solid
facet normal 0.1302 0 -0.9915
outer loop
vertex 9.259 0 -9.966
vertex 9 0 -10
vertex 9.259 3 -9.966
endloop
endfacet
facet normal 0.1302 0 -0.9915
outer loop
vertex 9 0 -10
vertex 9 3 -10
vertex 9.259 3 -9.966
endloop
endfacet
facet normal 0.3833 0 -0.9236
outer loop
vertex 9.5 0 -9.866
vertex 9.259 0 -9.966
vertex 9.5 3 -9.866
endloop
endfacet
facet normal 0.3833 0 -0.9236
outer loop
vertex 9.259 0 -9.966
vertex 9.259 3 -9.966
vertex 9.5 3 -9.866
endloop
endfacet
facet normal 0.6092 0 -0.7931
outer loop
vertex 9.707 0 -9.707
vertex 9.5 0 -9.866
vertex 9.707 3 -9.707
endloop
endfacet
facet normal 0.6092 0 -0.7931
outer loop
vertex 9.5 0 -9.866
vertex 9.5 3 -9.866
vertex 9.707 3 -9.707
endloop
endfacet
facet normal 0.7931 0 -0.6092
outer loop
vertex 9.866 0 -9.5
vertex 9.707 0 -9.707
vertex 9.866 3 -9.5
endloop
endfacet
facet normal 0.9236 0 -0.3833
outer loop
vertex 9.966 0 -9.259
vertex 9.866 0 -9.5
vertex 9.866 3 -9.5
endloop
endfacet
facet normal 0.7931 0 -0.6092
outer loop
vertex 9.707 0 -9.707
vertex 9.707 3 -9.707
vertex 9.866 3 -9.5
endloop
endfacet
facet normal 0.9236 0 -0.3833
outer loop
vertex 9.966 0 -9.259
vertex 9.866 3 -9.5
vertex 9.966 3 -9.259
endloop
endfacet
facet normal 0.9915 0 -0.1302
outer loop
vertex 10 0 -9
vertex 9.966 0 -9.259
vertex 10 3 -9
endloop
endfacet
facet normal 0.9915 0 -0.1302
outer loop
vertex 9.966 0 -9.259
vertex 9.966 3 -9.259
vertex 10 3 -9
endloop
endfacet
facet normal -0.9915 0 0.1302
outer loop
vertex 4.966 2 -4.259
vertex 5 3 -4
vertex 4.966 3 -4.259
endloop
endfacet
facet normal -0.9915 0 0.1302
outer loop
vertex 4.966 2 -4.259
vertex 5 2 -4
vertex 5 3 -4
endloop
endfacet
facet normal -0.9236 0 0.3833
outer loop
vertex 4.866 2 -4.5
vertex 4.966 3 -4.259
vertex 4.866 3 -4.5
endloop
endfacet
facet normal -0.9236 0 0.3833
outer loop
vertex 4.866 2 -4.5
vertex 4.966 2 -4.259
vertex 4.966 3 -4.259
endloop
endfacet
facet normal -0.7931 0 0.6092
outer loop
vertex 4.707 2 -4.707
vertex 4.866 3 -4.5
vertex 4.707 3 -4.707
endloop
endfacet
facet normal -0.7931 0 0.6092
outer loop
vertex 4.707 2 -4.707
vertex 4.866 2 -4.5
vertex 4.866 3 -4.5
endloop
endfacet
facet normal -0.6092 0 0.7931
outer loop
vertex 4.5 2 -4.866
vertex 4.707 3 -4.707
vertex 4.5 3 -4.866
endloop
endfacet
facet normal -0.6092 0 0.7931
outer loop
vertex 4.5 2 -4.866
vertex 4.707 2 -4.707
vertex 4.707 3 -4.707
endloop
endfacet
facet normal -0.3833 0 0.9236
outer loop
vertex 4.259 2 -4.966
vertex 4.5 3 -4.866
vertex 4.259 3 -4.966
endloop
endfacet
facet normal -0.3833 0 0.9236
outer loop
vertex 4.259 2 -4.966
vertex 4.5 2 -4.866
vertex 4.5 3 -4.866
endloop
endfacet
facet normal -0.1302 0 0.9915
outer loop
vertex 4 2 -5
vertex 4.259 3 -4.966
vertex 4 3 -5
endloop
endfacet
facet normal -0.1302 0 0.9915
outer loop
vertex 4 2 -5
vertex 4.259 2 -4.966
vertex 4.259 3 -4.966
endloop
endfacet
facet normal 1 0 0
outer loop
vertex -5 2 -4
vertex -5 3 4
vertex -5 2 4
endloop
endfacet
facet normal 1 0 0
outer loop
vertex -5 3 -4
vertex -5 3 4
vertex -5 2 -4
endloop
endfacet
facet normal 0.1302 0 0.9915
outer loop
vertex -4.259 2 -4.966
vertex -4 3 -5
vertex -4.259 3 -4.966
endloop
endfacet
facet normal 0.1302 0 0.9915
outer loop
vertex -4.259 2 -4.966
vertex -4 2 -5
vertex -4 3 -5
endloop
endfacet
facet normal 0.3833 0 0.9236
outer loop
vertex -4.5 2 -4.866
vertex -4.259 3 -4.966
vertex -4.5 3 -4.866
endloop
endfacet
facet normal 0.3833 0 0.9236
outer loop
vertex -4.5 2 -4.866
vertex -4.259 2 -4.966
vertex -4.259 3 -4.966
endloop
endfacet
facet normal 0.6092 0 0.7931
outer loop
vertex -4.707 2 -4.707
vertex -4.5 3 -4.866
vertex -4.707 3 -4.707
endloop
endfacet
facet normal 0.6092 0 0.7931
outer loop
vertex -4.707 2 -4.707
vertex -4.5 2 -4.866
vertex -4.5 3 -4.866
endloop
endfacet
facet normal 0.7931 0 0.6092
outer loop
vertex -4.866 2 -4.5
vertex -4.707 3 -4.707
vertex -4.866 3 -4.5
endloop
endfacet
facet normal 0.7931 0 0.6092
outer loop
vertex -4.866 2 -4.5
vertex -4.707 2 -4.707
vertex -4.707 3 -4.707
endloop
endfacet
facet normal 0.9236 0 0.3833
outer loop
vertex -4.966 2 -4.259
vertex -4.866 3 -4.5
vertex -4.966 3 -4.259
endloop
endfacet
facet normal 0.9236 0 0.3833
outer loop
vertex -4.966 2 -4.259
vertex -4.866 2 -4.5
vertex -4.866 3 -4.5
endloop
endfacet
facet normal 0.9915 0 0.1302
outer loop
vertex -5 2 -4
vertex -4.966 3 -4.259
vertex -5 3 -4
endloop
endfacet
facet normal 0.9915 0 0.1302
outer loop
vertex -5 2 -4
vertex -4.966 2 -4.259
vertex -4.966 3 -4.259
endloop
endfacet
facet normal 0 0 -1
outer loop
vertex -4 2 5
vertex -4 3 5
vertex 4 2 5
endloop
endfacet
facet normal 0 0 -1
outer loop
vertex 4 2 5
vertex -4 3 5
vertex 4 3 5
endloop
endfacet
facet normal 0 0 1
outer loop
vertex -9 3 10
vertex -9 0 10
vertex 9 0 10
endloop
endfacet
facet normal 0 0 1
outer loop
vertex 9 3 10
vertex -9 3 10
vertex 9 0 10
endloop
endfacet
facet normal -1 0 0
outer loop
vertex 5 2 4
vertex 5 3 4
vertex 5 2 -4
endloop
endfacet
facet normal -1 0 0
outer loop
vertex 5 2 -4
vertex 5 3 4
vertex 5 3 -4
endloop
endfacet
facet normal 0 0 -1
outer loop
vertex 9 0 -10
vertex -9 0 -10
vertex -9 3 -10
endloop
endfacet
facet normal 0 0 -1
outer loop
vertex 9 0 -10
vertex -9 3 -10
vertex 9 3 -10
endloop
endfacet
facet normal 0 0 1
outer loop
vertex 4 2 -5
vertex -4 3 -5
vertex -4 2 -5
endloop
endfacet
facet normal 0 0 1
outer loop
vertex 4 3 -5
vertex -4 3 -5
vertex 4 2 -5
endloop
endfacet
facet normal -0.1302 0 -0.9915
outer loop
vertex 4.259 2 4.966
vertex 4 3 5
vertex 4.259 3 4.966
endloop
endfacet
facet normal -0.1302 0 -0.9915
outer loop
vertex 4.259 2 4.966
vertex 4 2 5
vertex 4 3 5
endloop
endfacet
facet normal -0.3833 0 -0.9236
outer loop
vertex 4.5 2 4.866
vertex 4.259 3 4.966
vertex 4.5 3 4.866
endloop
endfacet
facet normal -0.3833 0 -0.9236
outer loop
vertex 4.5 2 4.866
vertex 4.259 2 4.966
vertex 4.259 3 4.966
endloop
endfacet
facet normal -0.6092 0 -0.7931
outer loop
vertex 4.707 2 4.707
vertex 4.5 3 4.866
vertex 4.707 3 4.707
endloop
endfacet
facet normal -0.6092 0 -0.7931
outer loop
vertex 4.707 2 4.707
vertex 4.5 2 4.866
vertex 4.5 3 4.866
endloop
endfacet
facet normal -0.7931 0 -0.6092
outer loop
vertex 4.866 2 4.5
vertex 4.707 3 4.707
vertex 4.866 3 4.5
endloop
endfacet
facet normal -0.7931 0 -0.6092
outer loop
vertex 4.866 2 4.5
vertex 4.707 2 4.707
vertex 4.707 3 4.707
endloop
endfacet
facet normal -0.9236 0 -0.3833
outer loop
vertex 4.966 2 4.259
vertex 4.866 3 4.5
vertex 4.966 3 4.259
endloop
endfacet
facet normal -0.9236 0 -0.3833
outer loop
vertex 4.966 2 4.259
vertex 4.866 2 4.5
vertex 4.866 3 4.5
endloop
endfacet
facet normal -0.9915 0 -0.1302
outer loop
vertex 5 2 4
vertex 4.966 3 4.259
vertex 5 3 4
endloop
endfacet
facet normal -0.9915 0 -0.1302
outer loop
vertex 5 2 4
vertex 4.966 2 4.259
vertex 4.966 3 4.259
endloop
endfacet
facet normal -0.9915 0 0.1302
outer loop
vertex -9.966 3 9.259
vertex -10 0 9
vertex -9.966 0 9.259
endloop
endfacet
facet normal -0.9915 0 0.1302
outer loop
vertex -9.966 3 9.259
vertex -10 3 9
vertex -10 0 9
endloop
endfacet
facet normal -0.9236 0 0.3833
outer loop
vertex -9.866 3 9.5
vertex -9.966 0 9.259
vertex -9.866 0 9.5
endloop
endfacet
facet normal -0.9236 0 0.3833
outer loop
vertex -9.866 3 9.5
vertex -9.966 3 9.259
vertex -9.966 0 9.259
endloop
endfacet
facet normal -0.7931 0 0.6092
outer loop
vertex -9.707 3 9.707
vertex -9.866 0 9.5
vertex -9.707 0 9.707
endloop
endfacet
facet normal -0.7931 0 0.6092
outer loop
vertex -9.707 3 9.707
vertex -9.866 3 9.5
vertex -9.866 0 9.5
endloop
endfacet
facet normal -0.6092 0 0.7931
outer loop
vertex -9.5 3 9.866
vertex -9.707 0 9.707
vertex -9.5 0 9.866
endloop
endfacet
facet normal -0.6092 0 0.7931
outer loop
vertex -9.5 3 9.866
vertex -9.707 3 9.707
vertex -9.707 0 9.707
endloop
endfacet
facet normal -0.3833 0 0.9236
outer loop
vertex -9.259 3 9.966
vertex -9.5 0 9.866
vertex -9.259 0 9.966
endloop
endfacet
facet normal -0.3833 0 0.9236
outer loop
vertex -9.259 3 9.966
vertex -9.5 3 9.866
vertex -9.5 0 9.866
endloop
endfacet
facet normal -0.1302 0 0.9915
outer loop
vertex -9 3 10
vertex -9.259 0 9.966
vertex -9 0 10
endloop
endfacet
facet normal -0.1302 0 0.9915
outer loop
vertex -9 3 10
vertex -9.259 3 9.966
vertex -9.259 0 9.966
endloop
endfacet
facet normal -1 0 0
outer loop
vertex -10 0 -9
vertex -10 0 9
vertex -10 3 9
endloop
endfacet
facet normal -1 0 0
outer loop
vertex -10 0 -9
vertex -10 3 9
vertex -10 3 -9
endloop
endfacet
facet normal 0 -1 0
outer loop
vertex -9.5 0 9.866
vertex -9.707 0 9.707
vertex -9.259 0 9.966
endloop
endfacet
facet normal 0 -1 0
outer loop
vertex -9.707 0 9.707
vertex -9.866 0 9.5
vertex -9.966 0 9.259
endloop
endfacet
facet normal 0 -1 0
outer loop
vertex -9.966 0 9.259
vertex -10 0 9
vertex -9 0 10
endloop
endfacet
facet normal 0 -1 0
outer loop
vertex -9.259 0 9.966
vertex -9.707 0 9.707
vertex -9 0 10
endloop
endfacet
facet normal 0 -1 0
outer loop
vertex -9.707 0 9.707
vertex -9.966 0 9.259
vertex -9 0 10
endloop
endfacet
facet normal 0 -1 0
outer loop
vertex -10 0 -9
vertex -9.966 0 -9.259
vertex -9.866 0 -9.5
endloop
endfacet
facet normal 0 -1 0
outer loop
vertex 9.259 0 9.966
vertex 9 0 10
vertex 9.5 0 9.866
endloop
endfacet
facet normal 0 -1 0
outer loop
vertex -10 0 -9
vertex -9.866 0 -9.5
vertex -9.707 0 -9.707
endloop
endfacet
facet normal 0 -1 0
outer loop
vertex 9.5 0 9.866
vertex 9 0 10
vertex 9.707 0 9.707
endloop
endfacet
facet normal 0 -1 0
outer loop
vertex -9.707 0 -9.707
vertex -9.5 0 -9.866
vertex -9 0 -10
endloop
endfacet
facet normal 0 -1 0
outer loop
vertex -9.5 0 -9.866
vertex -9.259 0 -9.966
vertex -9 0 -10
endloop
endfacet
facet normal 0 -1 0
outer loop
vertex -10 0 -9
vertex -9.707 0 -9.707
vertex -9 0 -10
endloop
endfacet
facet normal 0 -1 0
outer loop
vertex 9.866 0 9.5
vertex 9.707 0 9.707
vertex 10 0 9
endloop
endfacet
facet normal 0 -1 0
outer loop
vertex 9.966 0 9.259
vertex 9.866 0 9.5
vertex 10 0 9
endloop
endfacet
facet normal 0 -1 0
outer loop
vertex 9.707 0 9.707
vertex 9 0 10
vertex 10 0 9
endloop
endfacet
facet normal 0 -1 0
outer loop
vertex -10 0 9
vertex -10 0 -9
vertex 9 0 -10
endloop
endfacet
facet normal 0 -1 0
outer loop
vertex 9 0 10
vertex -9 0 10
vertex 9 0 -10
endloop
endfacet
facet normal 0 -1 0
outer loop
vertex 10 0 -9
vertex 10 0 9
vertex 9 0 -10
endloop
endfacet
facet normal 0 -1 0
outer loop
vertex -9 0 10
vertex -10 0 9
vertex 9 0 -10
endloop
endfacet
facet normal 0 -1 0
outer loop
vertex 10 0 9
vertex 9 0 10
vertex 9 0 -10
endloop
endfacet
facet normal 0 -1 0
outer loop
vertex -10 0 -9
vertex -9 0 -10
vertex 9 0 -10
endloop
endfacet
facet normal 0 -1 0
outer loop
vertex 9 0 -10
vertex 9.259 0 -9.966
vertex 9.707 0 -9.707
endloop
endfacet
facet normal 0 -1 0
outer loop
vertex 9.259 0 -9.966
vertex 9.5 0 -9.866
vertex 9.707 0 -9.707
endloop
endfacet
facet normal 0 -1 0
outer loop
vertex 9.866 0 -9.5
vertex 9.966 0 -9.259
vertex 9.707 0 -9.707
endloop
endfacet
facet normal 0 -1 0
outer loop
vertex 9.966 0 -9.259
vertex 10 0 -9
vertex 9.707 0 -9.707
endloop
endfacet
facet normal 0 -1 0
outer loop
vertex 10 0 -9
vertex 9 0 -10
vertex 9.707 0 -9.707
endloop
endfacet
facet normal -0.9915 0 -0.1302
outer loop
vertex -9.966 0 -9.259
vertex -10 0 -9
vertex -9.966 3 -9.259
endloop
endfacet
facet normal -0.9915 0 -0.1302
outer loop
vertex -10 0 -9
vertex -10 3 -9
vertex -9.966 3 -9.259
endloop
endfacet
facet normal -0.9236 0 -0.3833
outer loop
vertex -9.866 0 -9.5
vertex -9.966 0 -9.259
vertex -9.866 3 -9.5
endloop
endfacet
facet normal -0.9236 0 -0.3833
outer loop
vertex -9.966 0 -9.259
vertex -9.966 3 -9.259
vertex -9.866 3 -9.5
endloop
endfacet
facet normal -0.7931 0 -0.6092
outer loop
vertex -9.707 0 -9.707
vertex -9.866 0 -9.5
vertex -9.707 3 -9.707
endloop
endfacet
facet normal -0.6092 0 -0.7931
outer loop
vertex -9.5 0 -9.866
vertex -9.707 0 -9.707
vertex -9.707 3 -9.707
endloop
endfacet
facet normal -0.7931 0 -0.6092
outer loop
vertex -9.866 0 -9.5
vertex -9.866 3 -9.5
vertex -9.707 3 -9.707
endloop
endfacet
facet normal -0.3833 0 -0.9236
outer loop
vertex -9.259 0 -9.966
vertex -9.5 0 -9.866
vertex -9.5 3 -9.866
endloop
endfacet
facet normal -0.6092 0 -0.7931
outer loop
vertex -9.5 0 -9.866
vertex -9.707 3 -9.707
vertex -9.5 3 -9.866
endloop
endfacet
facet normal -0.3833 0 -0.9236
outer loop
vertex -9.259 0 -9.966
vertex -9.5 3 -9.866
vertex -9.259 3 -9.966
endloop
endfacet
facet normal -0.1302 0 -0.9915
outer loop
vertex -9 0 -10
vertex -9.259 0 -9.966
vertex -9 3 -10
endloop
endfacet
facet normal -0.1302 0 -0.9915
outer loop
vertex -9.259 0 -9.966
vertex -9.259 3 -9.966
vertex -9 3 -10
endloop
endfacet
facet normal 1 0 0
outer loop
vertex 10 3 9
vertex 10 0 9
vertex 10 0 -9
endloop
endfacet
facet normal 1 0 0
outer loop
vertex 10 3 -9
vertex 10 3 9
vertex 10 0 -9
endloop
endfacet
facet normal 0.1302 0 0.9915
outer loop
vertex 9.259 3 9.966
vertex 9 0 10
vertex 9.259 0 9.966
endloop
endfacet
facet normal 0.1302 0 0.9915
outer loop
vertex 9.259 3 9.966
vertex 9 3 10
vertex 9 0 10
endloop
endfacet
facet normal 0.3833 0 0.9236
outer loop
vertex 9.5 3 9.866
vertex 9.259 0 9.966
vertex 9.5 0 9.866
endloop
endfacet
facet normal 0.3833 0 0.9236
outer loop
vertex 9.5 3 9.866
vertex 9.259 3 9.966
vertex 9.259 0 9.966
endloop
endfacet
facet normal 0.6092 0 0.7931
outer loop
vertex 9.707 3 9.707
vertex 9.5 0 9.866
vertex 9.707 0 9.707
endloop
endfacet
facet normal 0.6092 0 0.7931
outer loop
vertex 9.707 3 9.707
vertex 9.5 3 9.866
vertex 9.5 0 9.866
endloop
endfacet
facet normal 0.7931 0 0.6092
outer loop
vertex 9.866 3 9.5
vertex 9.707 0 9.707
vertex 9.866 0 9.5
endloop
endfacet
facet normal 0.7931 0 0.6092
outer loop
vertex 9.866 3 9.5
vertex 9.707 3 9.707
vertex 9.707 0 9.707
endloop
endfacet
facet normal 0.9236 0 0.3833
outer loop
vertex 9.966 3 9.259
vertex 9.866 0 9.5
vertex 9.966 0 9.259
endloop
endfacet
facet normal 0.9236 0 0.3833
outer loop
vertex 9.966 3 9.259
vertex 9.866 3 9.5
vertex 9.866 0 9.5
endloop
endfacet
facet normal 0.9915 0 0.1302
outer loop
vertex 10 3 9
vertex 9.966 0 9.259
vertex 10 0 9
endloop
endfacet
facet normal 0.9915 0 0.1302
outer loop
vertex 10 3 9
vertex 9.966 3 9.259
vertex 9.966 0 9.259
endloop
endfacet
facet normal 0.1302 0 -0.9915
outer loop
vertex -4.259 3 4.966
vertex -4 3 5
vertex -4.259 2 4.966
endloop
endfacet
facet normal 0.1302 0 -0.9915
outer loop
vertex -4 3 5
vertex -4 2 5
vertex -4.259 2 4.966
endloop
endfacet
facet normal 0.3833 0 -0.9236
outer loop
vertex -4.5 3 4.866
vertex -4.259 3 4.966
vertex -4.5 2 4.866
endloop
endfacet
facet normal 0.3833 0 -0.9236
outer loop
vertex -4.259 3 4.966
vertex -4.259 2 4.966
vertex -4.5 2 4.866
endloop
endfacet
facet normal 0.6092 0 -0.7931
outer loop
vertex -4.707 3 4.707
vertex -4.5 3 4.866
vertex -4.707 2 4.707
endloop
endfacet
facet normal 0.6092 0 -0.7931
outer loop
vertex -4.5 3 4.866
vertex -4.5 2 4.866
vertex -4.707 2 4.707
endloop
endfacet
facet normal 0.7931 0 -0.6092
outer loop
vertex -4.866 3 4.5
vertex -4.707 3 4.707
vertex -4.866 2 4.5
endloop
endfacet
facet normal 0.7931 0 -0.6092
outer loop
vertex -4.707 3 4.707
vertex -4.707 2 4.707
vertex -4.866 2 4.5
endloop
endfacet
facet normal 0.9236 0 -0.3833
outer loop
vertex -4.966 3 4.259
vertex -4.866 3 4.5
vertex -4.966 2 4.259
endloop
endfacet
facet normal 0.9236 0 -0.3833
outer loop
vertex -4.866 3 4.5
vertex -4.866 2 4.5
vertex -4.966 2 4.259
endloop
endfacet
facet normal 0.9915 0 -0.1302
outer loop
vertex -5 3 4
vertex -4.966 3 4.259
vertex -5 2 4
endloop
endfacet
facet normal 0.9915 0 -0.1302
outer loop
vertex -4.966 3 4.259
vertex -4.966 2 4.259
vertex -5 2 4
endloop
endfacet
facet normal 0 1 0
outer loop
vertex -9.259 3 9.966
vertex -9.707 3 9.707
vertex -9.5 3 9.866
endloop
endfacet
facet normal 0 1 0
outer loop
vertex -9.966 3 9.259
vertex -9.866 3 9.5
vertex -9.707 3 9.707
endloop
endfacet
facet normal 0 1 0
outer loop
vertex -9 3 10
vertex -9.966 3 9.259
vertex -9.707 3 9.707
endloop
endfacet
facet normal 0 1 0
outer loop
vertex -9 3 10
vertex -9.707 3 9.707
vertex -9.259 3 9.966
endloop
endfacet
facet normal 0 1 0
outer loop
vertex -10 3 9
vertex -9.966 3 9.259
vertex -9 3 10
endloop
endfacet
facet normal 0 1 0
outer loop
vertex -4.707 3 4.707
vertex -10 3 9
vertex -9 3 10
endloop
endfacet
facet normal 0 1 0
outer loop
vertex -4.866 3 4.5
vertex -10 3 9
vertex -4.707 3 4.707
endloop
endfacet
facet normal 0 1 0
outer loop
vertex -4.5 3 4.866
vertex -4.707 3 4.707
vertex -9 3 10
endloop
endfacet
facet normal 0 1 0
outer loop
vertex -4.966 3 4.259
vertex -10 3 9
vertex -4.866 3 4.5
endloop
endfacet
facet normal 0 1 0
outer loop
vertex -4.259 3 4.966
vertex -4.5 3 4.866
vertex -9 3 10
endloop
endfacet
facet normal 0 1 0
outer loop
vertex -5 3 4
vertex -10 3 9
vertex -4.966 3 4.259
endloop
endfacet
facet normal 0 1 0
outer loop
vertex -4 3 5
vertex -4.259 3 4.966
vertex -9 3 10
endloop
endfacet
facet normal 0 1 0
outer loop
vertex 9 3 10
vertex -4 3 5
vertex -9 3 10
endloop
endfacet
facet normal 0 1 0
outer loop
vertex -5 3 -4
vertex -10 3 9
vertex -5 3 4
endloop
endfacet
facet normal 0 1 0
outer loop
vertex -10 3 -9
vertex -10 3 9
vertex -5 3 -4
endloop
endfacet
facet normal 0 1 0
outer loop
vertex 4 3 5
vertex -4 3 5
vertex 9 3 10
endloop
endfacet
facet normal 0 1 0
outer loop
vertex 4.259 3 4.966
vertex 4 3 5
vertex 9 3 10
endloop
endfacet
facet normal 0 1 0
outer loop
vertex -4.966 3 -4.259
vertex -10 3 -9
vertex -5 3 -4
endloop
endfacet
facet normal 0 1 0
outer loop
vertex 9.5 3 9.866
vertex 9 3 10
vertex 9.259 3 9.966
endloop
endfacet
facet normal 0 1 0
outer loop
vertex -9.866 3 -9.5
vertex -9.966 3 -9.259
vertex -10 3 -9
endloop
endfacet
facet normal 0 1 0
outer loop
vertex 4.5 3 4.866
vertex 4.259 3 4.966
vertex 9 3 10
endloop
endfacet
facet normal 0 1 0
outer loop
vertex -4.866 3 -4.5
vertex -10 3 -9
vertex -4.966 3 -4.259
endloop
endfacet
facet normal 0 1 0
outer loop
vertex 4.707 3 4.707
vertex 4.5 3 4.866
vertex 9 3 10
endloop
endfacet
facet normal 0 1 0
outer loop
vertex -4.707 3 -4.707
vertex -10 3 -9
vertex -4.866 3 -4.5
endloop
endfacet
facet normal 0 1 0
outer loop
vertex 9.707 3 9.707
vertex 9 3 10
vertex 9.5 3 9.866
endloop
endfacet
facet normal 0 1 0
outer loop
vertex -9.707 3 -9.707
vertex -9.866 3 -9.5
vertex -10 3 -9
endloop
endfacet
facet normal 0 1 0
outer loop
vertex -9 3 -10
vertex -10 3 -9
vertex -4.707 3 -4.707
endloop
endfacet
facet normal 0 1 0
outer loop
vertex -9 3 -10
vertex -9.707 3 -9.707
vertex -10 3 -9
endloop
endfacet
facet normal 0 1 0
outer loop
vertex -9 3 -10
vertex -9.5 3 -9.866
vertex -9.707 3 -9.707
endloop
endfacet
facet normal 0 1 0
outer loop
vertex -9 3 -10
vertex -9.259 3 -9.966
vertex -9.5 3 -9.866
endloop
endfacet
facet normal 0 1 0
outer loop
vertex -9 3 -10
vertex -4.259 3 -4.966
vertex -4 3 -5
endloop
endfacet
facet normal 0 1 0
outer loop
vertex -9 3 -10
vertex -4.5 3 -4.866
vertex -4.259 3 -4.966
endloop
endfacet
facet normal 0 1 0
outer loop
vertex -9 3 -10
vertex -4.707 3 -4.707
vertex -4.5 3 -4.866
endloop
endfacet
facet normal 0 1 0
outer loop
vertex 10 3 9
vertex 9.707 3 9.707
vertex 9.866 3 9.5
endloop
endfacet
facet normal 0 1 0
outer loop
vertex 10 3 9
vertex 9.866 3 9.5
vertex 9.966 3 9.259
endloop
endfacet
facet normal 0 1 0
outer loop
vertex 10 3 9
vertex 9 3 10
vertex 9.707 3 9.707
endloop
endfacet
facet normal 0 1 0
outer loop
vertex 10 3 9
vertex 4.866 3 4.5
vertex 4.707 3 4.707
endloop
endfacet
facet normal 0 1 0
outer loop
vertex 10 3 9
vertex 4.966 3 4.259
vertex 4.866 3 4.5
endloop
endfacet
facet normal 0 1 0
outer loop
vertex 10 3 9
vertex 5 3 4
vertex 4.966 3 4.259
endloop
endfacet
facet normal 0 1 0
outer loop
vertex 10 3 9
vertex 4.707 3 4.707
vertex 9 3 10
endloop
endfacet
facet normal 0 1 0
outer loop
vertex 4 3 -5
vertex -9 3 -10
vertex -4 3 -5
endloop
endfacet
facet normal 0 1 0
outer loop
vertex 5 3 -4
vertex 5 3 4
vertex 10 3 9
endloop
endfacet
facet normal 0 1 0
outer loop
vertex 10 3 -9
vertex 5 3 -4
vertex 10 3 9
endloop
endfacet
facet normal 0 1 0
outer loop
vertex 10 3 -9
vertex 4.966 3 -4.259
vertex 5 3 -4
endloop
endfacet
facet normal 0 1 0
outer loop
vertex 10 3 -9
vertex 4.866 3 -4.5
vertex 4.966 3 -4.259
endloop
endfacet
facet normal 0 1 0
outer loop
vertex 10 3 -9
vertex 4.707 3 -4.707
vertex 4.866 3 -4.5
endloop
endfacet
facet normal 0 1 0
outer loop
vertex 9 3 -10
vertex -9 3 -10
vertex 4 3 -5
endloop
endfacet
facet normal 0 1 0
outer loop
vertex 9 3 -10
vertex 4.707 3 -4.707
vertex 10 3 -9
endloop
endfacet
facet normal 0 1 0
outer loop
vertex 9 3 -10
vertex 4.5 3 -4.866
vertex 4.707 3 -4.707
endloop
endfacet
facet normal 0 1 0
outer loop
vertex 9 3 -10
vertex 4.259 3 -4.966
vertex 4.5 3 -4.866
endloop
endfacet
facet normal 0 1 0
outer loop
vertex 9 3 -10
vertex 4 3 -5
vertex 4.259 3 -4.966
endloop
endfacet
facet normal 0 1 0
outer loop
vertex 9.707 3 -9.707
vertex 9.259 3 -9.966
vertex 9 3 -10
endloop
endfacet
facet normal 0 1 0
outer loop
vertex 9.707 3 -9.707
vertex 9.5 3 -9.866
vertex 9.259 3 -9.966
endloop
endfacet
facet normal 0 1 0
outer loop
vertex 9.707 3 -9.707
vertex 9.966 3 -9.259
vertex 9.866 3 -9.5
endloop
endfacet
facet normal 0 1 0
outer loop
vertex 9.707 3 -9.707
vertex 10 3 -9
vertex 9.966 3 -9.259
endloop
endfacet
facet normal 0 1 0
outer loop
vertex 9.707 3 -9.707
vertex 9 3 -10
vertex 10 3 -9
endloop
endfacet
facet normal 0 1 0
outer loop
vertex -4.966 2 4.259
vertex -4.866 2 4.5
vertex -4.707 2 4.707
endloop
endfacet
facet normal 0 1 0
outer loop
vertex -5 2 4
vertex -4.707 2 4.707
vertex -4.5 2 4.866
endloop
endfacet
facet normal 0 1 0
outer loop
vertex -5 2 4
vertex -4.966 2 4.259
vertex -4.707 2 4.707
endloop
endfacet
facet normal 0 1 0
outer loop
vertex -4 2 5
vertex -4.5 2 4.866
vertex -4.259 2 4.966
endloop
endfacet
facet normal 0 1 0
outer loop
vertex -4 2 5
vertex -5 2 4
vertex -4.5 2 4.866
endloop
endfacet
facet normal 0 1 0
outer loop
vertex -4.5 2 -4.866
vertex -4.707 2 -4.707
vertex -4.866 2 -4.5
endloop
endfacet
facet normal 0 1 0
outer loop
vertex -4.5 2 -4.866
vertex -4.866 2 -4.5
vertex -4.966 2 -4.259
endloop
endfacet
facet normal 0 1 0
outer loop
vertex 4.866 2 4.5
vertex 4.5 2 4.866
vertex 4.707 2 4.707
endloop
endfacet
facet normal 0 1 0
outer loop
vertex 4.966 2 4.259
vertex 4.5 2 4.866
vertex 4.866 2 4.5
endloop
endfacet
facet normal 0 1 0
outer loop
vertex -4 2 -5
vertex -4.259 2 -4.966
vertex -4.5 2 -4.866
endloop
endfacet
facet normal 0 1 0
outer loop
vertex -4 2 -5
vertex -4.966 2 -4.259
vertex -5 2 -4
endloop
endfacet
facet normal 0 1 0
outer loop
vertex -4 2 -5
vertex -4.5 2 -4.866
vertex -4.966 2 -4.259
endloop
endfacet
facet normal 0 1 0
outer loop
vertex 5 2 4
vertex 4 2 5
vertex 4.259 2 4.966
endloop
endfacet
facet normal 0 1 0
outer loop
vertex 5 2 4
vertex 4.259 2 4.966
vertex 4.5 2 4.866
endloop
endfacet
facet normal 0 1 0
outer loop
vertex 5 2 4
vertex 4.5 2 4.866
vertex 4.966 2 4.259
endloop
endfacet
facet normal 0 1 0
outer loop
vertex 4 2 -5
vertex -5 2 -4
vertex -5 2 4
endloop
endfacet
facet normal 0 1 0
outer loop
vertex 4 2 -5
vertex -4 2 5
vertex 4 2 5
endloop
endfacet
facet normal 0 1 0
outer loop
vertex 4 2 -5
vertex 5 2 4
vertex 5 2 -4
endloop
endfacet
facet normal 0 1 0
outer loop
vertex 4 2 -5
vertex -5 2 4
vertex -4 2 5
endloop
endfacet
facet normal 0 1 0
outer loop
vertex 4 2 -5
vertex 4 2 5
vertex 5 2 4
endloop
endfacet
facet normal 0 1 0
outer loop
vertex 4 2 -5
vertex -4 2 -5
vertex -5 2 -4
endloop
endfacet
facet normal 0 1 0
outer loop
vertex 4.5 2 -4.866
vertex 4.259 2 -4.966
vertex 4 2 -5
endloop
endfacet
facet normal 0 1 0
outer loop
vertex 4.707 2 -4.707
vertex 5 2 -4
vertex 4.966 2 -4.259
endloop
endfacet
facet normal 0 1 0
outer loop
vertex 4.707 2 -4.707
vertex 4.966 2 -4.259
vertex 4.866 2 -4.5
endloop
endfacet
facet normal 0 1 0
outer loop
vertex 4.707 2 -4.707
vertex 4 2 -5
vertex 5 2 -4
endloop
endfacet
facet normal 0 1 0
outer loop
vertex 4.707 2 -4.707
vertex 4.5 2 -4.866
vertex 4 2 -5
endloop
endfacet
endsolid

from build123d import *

# Parameters (mm, degrees)
SKETCH1_W           = 20
SKETCH1_H           = 20
BOSS_EXTRUDE1_DEPTH = 3
SKETCH2_W           = 10
SKETCH2_H           = 10
CUT_EXTRUDE1_DEPTH  = 1
FILLET1_R           = 1


with BuildPart() as part:
    # Sketch1 → Boss-Extrude1 (new body)
    with BuildSketch(Plane(origin=(0, 0, 0), x_dir=(1, 0, 0), z_dir=(0, 1, 0))):
        Rectangle(SKETCH1_W, SKETCH1_H)
    extrude(amount=BOSS_EXTRUDE1_DEPTH)

    # Sketch2 → Cut-Extrude1 (cut)
    with BuildSketch(Plane(origin=(0, 3, 0), x_dir=(1, 0, 0), z_dir=(0, 1, 0))):
        Rectangle(SKETCH2_W, SKETCH2_H)
    extrude(amount=-CUT_EXTRUDE1_DEPTH, mode=Mode.SUBTRACT)

    # Fillet1
    fillet1_edges = [part.edges().sort_by_distance(p)[0] for p in [
        (-5, 2.5, 5),
        (-5, 2.5, -5),
        (5, 2.5, -5),
        (5, 2.5, 5),
        (-10, 1.5, -10),
        (10, 1.5, -10),
        (10, 1.5, 10),
        (-10, 1.5, 10),
    ]]
    fillet(fillet1_edges, radius=FILLET1_R)


solid = part.part
